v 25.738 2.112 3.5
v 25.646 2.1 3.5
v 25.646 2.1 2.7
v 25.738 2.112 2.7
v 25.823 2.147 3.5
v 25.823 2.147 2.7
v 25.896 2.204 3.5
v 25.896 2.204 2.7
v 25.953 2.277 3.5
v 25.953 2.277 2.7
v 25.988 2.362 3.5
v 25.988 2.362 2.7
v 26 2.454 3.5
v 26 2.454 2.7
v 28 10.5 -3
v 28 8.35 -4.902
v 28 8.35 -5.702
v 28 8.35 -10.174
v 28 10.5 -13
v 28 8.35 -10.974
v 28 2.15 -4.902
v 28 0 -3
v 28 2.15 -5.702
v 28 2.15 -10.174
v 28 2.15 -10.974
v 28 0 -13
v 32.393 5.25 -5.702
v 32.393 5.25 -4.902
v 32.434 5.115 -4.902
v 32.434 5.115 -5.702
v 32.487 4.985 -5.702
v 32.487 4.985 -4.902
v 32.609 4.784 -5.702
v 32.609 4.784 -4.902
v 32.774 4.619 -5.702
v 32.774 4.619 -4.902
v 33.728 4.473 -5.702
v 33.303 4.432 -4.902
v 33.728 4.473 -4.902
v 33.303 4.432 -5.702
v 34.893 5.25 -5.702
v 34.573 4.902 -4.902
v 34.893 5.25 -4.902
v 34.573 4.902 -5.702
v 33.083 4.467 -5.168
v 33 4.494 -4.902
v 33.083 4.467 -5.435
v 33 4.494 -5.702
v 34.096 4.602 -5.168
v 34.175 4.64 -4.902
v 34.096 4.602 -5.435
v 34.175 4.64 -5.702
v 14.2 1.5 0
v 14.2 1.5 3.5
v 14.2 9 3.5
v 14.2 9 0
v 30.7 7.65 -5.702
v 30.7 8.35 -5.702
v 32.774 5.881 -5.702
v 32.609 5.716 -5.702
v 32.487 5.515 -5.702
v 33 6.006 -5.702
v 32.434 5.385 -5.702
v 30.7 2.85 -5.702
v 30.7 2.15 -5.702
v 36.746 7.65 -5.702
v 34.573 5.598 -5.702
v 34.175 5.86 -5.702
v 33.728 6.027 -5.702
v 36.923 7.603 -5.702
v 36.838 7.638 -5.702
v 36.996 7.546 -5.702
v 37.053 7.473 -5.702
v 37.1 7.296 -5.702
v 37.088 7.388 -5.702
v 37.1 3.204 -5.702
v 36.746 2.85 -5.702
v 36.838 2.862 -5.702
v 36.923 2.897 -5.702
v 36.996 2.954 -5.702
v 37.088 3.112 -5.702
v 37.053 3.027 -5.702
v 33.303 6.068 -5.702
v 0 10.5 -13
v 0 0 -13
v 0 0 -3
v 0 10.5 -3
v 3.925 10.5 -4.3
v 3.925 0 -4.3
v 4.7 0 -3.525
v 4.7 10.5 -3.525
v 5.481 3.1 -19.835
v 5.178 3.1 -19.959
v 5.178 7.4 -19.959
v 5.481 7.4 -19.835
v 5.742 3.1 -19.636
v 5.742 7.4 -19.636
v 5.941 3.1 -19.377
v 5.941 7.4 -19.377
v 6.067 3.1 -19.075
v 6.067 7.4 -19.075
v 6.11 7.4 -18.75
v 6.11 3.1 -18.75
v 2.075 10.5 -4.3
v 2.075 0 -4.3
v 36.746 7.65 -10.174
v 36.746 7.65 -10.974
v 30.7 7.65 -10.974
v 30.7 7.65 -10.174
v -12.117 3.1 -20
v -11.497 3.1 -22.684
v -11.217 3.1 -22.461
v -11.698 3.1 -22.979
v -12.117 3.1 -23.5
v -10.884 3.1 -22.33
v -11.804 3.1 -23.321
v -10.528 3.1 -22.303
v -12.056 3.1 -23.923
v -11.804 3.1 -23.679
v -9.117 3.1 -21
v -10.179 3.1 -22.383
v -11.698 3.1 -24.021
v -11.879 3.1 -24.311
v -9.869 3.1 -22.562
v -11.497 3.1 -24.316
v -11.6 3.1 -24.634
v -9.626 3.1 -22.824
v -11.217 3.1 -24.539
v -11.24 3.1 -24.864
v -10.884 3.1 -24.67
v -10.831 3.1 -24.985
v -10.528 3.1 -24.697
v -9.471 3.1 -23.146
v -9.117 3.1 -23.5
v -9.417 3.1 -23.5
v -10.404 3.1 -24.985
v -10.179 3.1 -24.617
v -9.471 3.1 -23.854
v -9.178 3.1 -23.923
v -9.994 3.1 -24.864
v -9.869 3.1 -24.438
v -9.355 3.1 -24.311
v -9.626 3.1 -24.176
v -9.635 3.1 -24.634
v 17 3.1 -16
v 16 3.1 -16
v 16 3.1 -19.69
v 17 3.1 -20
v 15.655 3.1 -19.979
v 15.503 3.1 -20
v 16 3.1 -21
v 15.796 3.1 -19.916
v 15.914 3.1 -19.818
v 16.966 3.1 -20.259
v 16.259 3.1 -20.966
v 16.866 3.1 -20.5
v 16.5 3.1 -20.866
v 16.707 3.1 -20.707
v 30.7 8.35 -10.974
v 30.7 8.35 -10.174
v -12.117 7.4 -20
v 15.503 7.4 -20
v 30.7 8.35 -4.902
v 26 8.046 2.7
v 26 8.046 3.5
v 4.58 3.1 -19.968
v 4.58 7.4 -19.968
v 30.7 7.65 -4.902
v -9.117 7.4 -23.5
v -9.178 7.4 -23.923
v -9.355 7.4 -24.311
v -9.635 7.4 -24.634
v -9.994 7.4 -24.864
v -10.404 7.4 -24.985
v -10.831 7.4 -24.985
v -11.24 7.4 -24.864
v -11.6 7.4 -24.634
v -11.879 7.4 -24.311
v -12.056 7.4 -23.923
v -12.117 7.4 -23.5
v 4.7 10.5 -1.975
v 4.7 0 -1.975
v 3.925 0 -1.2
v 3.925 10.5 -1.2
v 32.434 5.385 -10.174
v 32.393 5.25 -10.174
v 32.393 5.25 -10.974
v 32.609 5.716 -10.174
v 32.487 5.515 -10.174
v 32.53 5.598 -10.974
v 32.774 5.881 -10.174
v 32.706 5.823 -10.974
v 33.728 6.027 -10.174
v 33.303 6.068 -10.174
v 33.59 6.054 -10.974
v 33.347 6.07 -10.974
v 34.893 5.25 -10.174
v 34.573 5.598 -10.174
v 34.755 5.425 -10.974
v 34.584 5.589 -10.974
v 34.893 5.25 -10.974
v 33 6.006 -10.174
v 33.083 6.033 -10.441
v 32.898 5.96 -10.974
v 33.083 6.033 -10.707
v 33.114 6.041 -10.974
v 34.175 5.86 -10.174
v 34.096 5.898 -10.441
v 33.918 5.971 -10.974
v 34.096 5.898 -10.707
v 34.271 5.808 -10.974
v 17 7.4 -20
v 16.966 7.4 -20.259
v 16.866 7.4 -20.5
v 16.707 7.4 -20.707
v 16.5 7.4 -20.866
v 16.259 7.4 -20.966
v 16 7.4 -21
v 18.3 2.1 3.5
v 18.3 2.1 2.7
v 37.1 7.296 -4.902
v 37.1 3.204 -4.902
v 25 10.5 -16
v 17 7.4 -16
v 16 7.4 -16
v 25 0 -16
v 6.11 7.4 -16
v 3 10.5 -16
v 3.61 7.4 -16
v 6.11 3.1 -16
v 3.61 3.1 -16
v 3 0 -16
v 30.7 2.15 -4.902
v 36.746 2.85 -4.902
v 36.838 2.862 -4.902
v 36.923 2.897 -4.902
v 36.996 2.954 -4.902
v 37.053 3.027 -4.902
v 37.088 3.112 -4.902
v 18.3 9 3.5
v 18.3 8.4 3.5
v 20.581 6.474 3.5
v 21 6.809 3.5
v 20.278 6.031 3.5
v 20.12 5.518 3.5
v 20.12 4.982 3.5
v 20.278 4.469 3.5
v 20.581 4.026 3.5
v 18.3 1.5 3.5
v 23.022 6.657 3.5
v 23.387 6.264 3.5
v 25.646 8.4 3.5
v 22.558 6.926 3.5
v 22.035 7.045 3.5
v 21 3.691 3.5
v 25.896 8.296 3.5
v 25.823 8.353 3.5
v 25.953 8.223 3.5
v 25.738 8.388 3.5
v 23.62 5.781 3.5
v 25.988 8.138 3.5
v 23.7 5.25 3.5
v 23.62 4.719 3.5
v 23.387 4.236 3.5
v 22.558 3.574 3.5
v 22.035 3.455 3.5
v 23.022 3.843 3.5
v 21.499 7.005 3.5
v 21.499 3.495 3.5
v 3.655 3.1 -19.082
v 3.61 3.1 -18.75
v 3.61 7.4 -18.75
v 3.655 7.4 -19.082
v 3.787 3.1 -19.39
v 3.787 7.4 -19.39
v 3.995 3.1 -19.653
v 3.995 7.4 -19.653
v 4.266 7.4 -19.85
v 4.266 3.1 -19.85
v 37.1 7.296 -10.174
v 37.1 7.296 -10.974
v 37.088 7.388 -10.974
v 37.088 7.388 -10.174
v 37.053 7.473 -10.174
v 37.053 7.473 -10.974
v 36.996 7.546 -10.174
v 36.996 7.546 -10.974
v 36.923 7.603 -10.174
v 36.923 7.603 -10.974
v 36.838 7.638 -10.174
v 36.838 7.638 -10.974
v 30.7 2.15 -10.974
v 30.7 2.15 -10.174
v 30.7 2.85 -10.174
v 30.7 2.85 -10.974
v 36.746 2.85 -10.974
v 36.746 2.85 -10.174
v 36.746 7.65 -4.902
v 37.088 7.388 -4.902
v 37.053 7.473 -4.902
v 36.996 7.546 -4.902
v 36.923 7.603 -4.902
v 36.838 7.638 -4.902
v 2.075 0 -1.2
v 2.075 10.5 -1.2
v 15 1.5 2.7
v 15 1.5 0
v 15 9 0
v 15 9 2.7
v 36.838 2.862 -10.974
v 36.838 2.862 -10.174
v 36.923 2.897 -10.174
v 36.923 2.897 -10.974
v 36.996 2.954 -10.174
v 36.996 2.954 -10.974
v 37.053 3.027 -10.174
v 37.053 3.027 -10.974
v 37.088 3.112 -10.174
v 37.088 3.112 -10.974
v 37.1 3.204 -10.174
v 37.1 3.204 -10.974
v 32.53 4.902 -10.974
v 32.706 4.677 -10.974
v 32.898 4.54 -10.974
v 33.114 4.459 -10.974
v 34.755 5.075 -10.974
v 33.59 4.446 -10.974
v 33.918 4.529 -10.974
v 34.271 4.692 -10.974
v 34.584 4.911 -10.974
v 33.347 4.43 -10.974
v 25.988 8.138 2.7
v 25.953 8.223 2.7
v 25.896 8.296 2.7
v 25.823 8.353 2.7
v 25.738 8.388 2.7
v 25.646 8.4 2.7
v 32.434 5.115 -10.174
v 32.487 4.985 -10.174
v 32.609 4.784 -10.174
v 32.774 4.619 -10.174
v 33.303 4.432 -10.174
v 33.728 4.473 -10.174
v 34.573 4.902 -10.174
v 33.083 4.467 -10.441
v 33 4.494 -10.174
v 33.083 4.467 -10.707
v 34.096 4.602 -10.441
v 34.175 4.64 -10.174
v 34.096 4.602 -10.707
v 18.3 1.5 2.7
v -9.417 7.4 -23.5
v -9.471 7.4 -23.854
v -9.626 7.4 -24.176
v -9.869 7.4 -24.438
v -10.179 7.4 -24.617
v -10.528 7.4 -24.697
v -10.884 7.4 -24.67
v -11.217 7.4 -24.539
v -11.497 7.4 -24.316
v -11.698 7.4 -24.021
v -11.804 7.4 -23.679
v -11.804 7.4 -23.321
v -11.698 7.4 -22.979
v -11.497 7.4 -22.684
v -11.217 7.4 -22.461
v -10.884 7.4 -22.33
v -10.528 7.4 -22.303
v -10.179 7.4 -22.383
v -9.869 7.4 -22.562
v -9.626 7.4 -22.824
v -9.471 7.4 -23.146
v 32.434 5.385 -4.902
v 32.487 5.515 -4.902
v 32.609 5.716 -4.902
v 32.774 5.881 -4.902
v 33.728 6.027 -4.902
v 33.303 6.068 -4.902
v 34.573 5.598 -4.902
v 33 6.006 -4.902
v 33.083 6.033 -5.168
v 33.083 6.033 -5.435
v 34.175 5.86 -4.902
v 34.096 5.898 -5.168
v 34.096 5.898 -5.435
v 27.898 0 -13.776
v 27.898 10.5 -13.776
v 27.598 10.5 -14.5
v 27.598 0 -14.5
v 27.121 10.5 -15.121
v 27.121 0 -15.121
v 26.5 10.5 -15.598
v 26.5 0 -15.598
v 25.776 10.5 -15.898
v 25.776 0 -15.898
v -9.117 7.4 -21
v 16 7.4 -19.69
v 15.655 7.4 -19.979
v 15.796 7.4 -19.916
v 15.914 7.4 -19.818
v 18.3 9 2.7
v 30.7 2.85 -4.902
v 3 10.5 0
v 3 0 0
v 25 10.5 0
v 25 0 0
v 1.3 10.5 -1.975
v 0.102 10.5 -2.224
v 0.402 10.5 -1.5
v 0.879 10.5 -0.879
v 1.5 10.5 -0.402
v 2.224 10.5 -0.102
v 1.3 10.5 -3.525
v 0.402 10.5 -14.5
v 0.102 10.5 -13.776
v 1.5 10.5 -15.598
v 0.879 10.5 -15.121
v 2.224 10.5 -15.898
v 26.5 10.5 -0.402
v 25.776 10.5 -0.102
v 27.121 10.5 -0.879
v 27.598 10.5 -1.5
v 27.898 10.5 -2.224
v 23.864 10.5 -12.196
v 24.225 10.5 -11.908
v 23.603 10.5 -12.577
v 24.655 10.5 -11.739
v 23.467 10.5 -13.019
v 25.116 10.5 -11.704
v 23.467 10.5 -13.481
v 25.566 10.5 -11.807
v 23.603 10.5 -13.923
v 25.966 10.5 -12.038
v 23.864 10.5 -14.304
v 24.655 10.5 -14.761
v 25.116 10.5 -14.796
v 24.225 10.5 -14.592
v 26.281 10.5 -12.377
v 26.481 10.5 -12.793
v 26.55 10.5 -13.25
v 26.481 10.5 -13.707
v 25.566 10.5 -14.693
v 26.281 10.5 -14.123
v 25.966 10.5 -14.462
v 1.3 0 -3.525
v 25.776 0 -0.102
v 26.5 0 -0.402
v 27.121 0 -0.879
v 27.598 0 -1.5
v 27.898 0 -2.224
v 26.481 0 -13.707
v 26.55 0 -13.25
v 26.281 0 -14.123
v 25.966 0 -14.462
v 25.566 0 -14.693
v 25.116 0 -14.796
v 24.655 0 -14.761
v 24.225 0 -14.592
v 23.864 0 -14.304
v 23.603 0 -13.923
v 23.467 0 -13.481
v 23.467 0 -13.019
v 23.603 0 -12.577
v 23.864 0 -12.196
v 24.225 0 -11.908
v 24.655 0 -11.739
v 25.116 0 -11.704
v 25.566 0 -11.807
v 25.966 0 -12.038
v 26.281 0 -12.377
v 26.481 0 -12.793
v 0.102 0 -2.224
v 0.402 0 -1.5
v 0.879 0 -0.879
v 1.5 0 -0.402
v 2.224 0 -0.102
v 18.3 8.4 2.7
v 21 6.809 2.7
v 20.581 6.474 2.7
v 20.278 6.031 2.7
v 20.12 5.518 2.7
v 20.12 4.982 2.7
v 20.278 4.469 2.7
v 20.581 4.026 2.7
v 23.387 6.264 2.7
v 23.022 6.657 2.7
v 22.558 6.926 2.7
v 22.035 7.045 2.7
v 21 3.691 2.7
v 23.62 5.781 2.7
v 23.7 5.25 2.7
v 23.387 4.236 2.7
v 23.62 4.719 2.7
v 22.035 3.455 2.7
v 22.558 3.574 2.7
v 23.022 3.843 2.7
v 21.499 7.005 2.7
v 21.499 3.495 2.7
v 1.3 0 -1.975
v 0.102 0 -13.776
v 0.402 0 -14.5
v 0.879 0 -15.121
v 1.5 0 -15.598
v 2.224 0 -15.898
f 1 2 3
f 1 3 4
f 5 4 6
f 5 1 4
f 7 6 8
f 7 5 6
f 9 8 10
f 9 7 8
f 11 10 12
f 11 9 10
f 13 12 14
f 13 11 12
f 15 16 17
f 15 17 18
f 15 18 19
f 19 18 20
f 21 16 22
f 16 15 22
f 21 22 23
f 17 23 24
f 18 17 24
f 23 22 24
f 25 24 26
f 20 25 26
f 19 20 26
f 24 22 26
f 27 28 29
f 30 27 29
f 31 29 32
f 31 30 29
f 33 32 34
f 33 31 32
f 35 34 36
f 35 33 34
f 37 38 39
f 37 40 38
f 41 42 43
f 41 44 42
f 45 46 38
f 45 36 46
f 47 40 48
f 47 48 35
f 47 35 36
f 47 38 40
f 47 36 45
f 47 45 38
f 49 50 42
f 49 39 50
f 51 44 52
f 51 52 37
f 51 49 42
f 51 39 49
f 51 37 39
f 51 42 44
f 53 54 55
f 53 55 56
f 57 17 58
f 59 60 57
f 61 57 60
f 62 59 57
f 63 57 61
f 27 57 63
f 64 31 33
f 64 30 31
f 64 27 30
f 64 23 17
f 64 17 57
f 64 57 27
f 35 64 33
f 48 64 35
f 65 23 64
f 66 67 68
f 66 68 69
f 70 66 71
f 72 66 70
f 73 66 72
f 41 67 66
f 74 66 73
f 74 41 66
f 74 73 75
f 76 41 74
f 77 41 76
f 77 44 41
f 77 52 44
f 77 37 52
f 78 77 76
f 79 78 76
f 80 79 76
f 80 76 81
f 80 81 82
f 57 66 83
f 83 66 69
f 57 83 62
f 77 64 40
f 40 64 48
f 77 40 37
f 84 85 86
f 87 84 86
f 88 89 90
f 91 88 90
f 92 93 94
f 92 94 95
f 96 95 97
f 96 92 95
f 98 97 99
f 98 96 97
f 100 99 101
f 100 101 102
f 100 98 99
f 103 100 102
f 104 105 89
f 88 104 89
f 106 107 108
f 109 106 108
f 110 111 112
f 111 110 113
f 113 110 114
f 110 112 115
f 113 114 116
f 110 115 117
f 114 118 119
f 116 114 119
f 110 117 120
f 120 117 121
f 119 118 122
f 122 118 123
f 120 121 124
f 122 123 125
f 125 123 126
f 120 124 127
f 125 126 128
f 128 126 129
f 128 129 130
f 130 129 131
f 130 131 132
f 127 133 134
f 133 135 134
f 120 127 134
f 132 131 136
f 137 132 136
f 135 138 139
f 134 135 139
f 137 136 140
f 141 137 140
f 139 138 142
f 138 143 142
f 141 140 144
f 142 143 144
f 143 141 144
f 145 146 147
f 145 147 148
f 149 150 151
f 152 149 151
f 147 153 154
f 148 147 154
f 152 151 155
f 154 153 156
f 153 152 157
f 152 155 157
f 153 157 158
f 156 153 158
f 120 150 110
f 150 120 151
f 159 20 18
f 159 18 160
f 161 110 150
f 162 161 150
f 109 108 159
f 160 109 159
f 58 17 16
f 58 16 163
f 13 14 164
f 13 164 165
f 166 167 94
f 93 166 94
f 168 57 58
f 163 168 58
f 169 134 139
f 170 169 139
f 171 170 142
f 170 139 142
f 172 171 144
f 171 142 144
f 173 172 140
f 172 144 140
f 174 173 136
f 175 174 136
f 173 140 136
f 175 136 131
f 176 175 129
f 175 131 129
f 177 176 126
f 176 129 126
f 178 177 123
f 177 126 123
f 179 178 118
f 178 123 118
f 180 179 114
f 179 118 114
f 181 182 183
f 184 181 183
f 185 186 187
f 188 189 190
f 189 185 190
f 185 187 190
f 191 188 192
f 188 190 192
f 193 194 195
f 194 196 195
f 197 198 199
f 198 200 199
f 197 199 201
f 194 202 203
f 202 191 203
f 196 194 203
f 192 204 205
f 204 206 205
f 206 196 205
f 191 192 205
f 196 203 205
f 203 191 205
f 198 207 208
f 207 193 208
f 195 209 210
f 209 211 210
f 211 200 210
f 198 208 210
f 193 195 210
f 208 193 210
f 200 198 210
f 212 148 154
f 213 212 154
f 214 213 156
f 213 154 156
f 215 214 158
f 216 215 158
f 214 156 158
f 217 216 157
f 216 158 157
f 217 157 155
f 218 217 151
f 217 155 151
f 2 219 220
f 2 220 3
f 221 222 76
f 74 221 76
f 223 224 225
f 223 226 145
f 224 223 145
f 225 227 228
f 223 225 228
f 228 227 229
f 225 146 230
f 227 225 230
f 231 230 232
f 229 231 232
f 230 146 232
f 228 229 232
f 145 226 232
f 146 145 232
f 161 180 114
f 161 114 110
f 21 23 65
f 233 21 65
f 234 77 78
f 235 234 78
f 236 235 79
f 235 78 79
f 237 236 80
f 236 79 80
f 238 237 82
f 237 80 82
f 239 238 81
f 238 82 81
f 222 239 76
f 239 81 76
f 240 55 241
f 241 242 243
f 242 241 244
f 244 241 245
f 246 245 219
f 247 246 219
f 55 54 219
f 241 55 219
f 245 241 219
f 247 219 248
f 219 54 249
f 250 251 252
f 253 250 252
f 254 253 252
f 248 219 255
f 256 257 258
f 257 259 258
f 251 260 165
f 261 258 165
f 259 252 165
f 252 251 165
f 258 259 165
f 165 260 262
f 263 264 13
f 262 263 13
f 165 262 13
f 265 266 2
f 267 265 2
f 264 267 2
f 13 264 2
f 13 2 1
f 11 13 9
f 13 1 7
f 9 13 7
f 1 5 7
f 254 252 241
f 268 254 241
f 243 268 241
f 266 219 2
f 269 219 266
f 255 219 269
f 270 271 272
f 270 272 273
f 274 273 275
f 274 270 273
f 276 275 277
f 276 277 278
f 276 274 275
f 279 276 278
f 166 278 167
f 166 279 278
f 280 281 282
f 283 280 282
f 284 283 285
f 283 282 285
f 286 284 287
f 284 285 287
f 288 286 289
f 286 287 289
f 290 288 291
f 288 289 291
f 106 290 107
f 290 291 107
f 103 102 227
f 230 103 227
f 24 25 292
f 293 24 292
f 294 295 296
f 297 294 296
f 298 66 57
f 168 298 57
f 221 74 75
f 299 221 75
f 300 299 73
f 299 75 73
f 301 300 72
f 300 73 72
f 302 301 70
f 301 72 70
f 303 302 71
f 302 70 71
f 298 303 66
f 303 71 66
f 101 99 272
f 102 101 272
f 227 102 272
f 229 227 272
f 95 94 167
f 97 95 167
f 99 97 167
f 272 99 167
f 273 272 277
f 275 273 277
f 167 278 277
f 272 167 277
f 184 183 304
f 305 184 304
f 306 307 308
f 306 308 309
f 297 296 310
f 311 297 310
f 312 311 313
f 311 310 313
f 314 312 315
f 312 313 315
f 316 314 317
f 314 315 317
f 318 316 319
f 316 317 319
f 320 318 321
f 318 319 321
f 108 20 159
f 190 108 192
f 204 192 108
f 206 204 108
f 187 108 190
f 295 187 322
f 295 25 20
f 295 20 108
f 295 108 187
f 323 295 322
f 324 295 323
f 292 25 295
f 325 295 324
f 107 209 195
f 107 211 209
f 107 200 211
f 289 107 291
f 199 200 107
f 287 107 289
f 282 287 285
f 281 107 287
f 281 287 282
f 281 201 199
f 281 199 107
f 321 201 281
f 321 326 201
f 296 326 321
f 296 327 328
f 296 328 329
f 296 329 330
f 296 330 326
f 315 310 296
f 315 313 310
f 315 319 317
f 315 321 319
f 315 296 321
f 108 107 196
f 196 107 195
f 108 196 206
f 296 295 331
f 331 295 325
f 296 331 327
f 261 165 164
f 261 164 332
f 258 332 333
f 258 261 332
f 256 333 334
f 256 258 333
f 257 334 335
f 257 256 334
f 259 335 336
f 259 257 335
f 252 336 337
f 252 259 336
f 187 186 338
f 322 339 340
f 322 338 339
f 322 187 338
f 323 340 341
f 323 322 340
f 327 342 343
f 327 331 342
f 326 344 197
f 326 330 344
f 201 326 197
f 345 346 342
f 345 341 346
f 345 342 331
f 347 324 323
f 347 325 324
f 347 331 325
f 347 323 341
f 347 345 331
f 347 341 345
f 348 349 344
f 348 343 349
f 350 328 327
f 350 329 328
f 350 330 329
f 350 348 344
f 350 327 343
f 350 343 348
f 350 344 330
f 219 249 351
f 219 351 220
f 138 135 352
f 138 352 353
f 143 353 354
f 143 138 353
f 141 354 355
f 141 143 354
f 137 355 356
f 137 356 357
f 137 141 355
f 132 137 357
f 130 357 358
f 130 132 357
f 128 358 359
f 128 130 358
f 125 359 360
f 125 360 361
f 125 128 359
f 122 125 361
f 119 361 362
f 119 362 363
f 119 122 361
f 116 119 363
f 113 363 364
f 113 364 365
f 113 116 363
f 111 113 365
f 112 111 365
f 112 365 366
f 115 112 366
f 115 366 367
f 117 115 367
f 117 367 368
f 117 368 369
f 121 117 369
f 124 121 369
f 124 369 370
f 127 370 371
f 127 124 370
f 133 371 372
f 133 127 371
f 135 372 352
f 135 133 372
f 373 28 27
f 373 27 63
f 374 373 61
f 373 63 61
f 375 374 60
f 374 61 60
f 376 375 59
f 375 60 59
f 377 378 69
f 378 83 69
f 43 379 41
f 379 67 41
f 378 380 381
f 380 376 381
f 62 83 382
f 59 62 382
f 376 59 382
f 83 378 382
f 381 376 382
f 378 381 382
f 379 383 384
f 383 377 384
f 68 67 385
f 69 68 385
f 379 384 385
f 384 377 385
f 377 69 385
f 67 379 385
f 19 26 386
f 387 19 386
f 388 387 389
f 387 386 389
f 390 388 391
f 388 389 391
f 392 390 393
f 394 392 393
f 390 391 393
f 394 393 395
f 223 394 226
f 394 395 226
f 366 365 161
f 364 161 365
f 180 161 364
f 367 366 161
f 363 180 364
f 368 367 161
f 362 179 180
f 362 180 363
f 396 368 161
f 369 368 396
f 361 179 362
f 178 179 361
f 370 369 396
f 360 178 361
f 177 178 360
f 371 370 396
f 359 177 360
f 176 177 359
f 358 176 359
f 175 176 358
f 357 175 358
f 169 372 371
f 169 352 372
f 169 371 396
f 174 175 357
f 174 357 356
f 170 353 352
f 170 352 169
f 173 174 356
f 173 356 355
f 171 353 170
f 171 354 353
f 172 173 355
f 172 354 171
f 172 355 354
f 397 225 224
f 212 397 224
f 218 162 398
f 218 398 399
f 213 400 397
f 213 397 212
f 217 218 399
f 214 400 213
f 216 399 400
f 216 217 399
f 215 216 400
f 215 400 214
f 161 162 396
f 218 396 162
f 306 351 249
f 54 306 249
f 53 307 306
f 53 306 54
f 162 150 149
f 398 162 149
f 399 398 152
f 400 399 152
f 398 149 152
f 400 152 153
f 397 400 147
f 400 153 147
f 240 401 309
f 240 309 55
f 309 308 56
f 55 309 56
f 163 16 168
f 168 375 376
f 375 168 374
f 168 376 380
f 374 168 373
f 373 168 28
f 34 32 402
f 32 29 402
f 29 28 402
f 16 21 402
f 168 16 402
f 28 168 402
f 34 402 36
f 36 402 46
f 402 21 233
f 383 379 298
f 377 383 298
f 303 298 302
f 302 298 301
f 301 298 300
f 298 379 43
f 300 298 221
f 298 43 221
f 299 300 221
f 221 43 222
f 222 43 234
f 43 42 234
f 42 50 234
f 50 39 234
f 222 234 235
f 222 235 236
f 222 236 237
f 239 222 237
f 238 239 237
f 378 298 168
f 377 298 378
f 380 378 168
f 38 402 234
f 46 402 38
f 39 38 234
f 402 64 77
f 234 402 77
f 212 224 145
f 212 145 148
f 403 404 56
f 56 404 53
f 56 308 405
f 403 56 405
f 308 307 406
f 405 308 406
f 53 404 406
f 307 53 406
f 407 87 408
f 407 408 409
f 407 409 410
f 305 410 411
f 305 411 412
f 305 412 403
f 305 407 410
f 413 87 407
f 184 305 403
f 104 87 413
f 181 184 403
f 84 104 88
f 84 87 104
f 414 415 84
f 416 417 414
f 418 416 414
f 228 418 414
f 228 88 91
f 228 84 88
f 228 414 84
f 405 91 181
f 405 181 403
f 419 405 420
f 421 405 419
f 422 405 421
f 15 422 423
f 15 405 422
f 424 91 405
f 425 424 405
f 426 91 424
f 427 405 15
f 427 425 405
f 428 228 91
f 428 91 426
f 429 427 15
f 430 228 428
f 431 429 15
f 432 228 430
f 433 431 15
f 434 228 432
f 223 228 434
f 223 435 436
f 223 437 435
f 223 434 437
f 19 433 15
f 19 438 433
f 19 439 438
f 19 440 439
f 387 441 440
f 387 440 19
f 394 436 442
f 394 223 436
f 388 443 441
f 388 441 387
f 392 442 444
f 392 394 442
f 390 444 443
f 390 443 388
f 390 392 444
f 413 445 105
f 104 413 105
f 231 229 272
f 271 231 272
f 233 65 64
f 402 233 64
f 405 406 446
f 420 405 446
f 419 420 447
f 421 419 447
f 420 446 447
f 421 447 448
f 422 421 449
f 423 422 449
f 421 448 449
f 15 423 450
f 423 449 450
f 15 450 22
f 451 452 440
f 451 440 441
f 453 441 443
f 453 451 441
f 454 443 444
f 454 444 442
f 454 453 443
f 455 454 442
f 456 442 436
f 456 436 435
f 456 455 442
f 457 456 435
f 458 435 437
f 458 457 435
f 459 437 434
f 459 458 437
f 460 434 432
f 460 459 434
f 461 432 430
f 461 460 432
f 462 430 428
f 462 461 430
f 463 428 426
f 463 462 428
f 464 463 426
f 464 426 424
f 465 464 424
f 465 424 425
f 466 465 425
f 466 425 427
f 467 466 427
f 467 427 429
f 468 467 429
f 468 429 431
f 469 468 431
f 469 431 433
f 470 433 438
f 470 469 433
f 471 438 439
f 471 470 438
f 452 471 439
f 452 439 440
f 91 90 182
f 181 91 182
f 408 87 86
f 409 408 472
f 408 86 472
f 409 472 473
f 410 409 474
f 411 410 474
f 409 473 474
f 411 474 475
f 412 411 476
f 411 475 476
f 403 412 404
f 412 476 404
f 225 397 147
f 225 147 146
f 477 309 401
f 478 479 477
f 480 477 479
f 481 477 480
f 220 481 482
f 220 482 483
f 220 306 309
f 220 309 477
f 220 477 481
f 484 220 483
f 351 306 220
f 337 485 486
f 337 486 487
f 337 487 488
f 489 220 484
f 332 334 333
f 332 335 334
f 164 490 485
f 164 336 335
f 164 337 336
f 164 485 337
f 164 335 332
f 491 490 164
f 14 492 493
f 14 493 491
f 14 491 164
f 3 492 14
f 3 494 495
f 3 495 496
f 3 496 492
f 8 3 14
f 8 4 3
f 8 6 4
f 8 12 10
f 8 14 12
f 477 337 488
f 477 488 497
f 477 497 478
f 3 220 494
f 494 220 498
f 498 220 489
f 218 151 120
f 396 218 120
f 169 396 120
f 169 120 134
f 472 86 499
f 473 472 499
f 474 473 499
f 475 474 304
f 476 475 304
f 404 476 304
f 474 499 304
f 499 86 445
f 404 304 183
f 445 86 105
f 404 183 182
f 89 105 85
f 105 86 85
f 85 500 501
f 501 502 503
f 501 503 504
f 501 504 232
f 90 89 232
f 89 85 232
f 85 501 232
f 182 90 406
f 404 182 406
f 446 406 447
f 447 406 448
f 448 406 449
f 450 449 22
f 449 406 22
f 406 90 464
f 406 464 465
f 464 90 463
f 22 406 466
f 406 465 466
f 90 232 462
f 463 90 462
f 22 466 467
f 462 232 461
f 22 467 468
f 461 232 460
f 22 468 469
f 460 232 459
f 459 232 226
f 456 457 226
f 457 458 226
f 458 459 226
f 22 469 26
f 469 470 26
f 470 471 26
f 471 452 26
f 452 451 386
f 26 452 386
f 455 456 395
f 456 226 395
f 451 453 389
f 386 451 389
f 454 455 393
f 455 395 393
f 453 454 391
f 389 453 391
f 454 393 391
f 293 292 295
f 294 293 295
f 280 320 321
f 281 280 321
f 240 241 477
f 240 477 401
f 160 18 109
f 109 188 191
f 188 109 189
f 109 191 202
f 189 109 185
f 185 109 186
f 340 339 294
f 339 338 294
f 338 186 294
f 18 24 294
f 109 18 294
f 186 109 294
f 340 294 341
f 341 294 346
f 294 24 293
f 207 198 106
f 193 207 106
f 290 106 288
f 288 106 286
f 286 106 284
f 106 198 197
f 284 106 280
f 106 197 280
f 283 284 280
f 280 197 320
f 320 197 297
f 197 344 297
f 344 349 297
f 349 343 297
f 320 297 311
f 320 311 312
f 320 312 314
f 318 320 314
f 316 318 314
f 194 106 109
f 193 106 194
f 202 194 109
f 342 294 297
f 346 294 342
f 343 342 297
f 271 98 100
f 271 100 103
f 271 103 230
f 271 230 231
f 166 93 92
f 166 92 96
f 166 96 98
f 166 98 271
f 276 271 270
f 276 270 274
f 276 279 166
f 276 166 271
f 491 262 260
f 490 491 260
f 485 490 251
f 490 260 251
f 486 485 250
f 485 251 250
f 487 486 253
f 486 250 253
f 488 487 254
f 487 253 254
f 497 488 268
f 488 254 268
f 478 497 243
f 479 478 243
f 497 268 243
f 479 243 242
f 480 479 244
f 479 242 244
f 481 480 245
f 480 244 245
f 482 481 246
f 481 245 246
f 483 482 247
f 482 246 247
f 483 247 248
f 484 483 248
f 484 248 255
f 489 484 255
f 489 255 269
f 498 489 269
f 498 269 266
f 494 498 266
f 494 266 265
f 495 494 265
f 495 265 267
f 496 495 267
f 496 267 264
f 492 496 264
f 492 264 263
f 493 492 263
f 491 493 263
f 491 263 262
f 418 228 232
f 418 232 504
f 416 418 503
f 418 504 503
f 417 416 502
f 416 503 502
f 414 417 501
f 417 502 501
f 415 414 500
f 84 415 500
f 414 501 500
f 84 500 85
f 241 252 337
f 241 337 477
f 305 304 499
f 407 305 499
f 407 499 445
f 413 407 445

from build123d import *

# Parameters (mm, degrees)
CROQUIS1_R              = 1.55
SALIENTE_EXTRUIR1_DEPTH = 10.5
CROQUIS2_R              = 1.2
SALIENTE_EXTRUIR2_DEPTH = 4.3
SALIENTE_EXTRUIR6_DEPTH = 4.3
SALIENTE_EXTRUIR7_DEPTH = 7.5
CROQUIS5_R              = 1.8
CORTAR_EXTRUIR1_DEPTH   = 1.5
CROQUIS6_W              = 9.1
CROQUIS6_H              = 0.8
SALIENTE_EXTRUIR8_DEPTH = 6.2
CORTAR_EXTRUIR2_DEPTH   = 7.2


with BuildPart() as part:
    # Croquis1 → Saliente-Extruir1 (new body)
    with BuildSketch(Plane(origin=(0, 0, 0), x_dir=(1, 0, 0), z_dir=(0, 1, 0))):
        with BuildLine():
            Line((3, 0), (25, 0))
            ThreePointArc((25, 0), (27.121320344, 0.878679656), (28, 3))
            Line((28, 3), (28, 13))
            ThreePointArc((28, 13), (27.121320344, 15.121320344), (25, 16))
            Line((25, 16), (3, 16))
            ThreePointArc((3, 16), (0.878679656, 15.121320344), (0, 13))
            Line((0, 13), (0, 3))
            ThreePointArc((0, 3), (0.878679656, 0.878679656), (3, 0))
        make_face()
        with Locations((25, 13.25)):
            Circle(CROQUIS1_R, mode=Mode.SUBTRACT)
        Polygon((1.3, 3.525), (2.075, 4.3), (3.925, 4.3), (4.7, 3.525), (4.7, 1.975), (3.925, 1.2), (2.075, 1.2), (1.3, 1.975), (1.3, 2.75), align=None, mode=Mode.SUBTRACT)
    extrude(amount=SALIENTE_EXTRUIR1_DEPTH)

    # Croquis2 → Saliente-Extruir2 (add)
    with BuildSketch(Plane(origin=(0, 3.1, 0), x_dir=(1, 0, 0), z_dir=(0, 1, 0))):
        with BuildLine():
            Line((-12.117246013, 20), (15.502753987, 20))
            ThreePointArc((15.502753987, 20), (15.795636527, 19.916267232), (16, 19.69037582))
            Line((16, 19.69037582), (16, 16))
            Line((16, 16), (17, 16))
            Line((17, 16), (17, 20))
            ThreePointArc((17, 20), (16.707106781, 20.707106781), (16, 21))
            Line((16, 21), (-9.117246013, 21))
            Line((-9.117246013, 21), (-9.117246013, 23.5))
            ThreePointArc((-9.117246013, 23.5), (-10.617246013, 25), (-12.117246013, 23.5))
            Line((-12.117246013, 23.5), (-12.117246013, 21))
            Line((-12.117246013, 21), (-12.117246013, 20))
        make_face()
        with Locations((-10.617246013, 23.5)):
            Circle(CROQUIS2_R, mode=Mode.SUBTRACT)
    extrude(amount=SALIENTE_EXTRUIR2_DEPTH)

    # Croquis3 → Saliente-Extruir6 (add)
    with BuildSketch(Plane(origin=(0, 3.1, 0), x_dir=(1, 0, 0), z_dir=(0, 1, 0))):
        with BuildLine():
            Line((4.579945188, 19.96820969), (5.178103837, 19.958862719))
            ThreePointArc((5.178103837, 19.958862719), (5.85002436, 19.513199542), (6.110061503, 18.75))
            Line((6.110061503, 18.75), (6.110061503, 16))
            Line((6.110061503, 16), (3.610061503, 16))
            Line((3.610061503, 16), (3.610061503, 18.75))
            ThreePointArc((3.610061503, 18.75), (3.882143972, 19.52857389), (4.579945188, 19.96820969))
        make_face()
    extrude(amount=SALIENTE_EXTRUIR6_DEPTH)

    # Croquis4 → Saliente-Extruir7 (add)
    with BuildSketch(Plane(origin=(0, 1.5, 0), x_dir=(1, 0, 0), z_dir=(0, 1, 0))):
        Polygon((15, 0), (15, -2.7), (26, -2.7), (26, -3.5), (15, -3.5), (14.2, -3.5), (14.2, 0), align=None)
    extrude(amount=SALIENTE_EXTRUIR7_DEPTH)

    # Croquis5 → Cortar-Extruir1 (cut)
    with BuildSketch(Plane.XY.offset(3.5)):
        with Locations((21.9, 5.25)):
            Circle(CROQUIS5_R)
        with BuildLine():
            Line((26, 1.5), (18.3, 1.5))
            Line((18.3, 1.5), (18.3, 2.1))
            Line((18.3, 2.1), (25.646446609, 2.1))
            ThreePointArc((25.646446609, 2.1), (25.896446609, 2.203553391), (26, 2.453553391))
            Line((26, 2.453553391), (26, 8.046446609))
            ThreePointArc((26, 8.046446609), (25.896446609, 8.296446609), (25.646446609, 8.4))
            Line((25.646446609, 8.4), (18.3, 8.4))
            Line((18.3, 8.4), (18.3, 9))
            Line((18.3, 9), (27.293222539, 9))
            Line((27.293222539, 9), (27.293222539, 1.5))
            Line((27.293222539, 1.5), (26, 1.5))
        make_face()
    extrude(amount=-CORTAR_EXTRUIR1_DEPTH, mode=Mode.SUBTRACT)

    # Croquis6 → Saliente-Extruir8 (add)
    with BuildSketch(Plane(origin=(0, 2.15, 0), x_dir=(1, 0, 0), z_dir=(0, 1, 0))):
        with Locations((32.55, 10.574019752)):
            Rectangle(CROQUIS6_W, CROQUIS6_H)
        with Locations((32.55, 5.301623485)):
            Rectangle(CROQUIS6_W, CROQUIS6_H)
    extrude(amount=SALIENTE_EXTRUIR8_DEPTH)

    # Croquis7 → Cortar-Extruir2 (cut)
    with BuildSketch(Plane(origin=(0, 0, -10.974019752), x_dir=(-1, 0, 0), z_dir=(0, 0, -1))):
        with BuildLine():
            Line((-37.1, 2.15), (-30.7, 2.15))
            Line((-30.7, 2.15), (-30.7, 2.85))
            Line((-30.7, 2.85), (-36.746446609, 2.85))
            ThreePointArc((-36.746446609, 2.85), (-36.996446609, 2.953553391), (-37.1, 3.203553391))
            Line((-37.1, 3.203553391), (-37.1, 7.296446609))
            ThreePointArc((-37.1, 7.296446609), (-36.996446609, 7.546446609), (-36.746446609, 7.65))
            Line((-36.746446609, 7.65), (-30.7, 7.65))
            Line((-30.7, 7.65), (-30.7, 8.35))
            Line((-30.7, 8.35), (-37.1, 8.35))
            Line((-37.1, 8.35), (-38.596530357, 8.35))
            Line((-38.596530357, 8.35), (-38.596530357, 2.85))
            Line((-38.596530357, 2.85), (-38.596530357, 2.15))
            Line((-38.596530357, 2.15), (-37.1, 2.15))
        make_face()
        with BuildLine():
            add(Edge.make_bspline(
                [(-32.392984362, 5.25), (-32.743324346, 3.873805387), (-34.382207103, 4.479328863), (-34.892984362, 5.25)],
                knots=[0, 0, 0, 0, 1, 1, 1, 1], degree=3))
            add(Edge.make_bspline(
                [(-32.392984362, 5.25), (-32.743324346, 6.626194613), (-34.382207103, 6.020671137), (-34.892984362, 5.25)],
                knots=[0, 0, 0, 0, 1, 1, 1, 1], degree=3))
        make_face()
    extrude(amount=-CORTAR_EXTRUIR2_DEPTH, mode=Mode.SUBTRACT)


solid = part.part
